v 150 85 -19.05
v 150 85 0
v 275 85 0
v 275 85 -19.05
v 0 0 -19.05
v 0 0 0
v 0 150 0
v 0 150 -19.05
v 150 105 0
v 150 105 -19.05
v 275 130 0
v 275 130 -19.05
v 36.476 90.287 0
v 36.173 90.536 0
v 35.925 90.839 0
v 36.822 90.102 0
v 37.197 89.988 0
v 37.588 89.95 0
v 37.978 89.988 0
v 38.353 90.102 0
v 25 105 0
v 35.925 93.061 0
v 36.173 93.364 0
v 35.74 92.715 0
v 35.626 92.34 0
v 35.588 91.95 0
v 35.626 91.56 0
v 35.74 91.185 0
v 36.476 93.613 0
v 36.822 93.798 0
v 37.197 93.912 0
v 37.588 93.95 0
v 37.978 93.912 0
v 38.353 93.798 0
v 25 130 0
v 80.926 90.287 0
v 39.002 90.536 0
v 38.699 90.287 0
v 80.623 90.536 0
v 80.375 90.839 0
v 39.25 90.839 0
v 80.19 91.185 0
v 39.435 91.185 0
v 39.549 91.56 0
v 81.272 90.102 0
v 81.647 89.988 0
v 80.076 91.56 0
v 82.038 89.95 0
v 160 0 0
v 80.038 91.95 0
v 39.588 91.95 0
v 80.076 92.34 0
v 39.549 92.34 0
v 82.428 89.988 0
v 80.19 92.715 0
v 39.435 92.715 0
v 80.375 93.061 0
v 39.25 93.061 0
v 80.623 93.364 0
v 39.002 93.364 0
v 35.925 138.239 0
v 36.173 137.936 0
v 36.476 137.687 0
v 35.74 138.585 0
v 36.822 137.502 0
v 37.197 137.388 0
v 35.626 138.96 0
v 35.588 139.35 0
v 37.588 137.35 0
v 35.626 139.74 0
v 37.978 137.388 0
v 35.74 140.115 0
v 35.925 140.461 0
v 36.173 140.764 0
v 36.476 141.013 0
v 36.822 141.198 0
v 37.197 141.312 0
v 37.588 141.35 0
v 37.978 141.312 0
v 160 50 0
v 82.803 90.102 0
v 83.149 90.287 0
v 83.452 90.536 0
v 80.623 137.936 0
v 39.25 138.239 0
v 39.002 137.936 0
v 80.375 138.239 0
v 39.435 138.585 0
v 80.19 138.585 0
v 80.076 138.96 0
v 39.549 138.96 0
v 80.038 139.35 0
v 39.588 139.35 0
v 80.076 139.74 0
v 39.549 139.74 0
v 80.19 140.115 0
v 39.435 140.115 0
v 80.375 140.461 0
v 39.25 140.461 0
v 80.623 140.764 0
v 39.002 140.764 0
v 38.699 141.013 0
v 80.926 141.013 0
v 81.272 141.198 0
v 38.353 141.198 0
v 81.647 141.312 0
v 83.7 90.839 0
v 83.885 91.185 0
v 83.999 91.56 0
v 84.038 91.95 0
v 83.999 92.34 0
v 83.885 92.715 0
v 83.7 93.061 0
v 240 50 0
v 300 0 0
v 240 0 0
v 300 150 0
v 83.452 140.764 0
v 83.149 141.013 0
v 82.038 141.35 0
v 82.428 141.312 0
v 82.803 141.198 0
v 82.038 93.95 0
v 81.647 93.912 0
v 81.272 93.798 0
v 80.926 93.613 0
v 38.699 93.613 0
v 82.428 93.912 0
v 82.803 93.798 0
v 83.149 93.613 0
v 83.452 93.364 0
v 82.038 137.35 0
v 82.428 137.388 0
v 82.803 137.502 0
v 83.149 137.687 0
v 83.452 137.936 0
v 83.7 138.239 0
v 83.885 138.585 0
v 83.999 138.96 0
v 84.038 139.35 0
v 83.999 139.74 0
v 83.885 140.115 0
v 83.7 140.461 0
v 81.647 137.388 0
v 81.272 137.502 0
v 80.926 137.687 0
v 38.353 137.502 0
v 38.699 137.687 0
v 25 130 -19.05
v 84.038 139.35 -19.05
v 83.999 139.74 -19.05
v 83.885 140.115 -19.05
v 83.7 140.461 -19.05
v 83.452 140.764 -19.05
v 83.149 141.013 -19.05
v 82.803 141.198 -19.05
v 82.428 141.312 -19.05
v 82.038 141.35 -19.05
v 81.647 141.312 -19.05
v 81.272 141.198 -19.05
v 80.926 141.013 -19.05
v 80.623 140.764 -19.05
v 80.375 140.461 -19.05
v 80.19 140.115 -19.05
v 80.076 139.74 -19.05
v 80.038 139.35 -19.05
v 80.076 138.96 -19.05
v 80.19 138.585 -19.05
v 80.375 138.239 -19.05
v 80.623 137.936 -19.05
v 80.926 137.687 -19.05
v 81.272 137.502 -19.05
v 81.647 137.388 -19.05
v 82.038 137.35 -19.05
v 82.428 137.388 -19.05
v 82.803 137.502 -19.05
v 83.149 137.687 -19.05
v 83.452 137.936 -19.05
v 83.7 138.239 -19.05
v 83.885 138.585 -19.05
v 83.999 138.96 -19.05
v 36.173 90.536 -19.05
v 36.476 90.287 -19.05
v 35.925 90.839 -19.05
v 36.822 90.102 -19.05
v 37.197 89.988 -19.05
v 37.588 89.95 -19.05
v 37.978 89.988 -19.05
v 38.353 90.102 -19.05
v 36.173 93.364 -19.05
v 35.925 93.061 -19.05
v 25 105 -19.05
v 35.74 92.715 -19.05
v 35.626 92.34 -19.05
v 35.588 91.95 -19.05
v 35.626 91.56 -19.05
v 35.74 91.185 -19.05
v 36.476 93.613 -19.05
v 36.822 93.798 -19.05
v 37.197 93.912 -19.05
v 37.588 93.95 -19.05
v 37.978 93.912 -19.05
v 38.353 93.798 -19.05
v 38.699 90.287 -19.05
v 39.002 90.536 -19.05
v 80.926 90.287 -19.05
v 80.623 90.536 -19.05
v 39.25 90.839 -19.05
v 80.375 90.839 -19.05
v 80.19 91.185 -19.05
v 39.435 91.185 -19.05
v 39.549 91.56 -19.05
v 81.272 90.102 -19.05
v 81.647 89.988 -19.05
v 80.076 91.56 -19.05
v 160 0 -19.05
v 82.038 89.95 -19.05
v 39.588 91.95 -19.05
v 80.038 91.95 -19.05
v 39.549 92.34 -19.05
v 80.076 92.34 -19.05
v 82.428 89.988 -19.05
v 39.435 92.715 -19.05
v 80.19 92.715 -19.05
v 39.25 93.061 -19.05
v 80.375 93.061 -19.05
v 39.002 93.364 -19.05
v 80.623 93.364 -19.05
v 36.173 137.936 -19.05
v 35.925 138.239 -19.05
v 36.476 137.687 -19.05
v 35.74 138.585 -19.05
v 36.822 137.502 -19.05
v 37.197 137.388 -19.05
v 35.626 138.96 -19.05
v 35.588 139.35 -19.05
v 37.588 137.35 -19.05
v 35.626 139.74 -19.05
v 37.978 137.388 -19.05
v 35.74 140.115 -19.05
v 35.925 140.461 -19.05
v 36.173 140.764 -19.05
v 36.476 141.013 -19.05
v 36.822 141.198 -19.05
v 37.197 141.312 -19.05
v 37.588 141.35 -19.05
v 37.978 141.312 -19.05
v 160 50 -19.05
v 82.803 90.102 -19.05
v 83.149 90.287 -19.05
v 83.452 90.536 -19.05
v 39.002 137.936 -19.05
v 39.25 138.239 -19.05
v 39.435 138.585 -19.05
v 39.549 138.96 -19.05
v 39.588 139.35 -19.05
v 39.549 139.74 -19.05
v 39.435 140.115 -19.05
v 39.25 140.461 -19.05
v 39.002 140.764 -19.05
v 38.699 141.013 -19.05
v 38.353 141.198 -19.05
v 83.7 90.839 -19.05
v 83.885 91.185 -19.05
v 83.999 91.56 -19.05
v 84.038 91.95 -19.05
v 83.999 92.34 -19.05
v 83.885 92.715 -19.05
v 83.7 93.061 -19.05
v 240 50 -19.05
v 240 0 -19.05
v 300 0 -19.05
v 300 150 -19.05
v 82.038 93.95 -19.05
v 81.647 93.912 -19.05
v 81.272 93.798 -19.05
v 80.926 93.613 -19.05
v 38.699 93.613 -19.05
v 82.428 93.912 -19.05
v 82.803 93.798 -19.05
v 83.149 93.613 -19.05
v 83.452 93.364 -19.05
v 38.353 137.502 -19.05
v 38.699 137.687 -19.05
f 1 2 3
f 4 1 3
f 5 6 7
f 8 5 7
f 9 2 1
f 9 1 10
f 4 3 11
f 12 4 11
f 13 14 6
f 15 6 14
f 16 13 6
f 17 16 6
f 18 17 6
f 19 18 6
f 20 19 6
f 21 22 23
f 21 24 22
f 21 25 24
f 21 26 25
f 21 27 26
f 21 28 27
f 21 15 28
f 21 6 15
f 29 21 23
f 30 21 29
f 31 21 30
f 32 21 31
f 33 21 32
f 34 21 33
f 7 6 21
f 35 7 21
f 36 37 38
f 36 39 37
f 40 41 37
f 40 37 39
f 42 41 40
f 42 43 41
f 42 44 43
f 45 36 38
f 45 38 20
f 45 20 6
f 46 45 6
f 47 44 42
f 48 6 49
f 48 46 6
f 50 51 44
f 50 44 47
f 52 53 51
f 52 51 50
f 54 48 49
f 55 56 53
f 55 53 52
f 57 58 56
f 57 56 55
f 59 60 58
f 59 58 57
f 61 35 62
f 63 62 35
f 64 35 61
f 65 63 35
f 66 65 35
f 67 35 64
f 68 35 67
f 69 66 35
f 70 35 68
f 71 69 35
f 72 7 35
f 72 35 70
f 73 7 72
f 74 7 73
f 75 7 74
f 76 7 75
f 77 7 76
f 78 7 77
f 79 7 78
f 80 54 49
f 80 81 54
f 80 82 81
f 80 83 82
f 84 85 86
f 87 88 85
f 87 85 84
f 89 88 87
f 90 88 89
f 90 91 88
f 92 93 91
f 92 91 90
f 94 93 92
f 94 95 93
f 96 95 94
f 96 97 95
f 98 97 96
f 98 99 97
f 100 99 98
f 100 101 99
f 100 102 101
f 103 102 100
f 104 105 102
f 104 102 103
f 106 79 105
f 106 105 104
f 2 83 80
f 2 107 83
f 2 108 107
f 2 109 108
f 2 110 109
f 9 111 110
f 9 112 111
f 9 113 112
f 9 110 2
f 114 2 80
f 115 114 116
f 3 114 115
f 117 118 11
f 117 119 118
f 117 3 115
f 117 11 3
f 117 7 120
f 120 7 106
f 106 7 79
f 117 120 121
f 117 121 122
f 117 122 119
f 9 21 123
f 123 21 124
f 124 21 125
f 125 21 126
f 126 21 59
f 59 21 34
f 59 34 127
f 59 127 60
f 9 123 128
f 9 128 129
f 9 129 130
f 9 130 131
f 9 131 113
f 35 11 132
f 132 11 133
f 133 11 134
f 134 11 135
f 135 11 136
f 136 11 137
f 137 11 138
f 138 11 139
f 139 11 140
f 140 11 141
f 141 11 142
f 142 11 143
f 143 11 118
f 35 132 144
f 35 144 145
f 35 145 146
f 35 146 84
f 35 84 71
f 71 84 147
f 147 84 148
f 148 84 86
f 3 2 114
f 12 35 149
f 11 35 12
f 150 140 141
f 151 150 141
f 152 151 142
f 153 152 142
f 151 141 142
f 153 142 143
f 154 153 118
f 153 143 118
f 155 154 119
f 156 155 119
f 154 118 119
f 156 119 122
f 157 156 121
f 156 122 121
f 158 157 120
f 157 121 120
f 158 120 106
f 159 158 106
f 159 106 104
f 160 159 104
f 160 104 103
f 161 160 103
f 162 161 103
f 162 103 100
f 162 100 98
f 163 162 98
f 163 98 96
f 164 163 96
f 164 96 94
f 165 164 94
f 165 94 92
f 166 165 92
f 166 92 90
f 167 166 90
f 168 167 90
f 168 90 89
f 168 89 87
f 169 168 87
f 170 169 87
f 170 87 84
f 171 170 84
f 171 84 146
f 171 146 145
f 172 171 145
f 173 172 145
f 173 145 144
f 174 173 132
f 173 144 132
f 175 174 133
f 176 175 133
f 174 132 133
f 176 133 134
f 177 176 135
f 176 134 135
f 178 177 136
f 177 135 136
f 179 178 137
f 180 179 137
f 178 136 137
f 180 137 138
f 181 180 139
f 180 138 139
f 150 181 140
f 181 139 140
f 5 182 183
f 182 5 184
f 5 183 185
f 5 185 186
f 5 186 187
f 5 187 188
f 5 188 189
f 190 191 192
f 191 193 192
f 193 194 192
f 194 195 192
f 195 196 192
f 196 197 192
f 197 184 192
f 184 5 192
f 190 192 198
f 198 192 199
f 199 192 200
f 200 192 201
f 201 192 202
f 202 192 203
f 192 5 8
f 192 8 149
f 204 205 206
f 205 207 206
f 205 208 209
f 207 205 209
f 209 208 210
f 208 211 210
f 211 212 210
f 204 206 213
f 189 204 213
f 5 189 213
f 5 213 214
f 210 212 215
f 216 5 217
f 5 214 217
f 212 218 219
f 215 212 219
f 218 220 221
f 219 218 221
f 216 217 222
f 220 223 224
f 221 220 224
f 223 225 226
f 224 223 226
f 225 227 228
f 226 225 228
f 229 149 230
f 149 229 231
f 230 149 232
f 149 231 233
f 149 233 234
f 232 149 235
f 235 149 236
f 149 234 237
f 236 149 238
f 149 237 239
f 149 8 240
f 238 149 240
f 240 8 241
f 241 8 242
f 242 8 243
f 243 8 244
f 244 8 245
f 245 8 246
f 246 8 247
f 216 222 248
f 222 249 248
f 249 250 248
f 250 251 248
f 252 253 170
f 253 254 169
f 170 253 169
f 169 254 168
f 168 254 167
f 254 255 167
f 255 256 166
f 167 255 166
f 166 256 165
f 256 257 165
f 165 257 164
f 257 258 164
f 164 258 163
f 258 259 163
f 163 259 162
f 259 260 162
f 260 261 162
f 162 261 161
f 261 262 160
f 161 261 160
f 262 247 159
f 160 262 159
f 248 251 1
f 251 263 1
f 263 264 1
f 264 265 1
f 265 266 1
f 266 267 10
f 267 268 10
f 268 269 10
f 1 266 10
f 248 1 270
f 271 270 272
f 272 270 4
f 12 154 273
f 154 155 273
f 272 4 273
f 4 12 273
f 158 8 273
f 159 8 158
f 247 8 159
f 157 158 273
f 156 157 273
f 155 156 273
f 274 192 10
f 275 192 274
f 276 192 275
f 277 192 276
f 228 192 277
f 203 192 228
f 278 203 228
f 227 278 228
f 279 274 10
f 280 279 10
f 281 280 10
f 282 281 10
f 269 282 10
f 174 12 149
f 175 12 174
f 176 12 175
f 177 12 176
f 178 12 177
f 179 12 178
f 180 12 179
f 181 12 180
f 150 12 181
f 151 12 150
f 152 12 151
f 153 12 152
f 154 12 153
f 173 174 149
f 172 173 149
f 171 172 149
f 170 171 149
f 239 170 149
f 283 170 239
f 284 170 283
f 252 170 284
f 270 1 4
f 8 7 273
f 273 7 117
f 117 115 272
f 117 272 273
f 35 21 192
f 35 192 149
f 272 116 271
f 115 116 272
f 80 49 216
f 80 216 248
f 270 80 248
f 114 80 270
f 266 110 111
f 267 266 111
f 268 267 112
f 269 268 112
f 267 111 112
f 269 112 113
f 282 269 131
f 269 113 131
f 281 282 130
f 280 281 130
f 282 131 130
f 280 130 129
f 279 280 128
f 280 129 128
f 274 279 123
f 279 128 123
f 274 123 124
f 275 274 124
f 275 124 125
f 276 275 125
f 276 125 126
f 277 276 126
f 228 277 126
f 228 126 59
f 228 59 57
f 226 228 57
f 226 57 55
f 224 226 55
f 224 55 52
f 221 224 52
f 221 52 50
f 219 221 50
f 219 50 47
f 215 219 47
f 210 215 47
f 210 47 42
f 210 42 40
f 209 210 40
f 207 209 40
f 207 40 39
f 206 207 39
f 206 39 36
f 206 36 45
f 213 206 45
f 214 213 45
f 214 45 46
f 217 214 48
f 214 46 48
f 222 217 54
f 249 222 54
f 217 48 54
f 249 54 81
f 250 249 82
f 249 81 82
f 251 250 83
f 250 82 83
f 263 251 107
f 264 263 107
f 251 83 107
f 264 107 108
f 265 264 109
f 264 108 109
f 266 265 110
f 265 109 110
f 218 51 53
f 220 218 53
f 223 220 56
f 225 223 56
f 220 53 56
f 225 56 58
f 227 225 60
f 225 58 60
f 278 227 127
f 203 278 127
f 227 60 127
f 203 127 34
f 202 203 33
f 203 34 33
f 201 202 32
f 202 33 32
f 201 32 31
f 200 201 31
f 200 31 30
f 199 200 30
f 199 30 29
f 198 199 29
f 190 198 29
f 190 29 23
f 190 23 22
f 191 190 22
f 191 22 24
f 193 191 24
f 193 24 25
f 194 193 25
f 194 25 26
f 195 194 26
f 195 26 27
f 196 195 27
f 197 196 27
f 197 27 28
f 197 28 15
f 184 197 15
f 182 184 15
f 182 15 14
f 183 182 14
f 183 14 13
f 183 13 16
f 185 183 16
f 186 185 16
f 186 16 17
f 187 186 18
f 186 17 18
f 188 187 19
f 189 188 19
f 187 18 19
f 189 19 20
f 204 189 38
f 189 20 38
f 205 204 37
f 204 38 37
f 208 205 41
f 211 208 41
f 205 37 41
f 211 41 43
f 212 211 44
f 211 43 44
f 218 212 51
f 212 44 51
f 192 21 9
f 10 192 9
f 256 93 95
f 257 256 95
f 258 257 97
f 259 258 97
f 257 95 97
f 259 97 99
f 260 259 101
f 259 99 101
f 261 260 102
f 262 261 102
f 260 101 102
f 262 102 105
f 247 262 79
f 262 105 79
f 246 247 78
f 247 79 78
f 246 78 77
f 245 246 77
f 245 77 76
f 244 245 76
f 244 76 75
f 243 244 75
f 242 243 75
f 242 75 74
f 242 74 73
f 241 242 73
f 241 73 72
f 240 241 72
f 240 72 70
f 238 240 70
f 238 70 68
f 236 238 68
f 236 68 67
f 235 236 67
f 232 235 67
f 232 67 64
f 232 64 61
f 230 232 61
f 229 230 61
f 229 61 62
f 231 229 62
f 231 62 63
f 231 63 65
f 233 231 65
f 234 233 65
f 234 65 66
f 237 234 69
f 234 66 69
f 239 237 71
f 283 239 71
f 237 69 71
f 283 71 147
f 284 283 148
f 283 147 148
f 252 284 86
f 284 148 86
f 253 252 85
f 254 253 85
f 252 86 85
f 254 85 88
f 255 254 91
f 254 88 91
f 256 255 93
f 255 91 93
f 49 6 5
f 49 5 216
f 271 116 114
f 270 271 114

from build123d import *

# Parameters (mm, degrees)
SKETCH1_W          = 300
SKETCH1_H          = 150
BLOCK_DEPTH        = 19.05
SKETCH3_W          = 250
SKETCH3_H          = 25
CUT_EXTRUDE2_DEPTH = 39.961179
SKETCH6_W          = 125
SKETCH6_H          = 20
CUT_EXTRUDE5_DEPTH = 20.05
SKETCH7_W          = 80
SKETCH7_H          = 50
CUT_EXTRUDE6_DEPTH = 20.05
SKETCH8_R          = 2
CUT_EXTRUDE7_DEPTH = 20.05


with BuildPart() as part:
    # Sketch1 → block (new body)
    with BuildSketch(Plane.XY):
        with Locations((150, 75)):
            Rectangle(SKETCH1_W, SKETCH1_H)
    extrude(amount=-BLOCK_DEPTH)

    # Sketch3 → Cut-Extrude2 (cut)
    with BuildSketch(Plane.XY):
        with Locations((150, 117.5)):
            Rectangle(SKETCH3_W, SKETCH3_H)
    extrude(amount=-CUT_EXTRUDE2_DEPTH, mode=Mode.SUBTRACT)

    # Sketch6 → Cut-Extrude5 (cut, through all)
    with BuildSketch(Plane.XY):
        with Locations((212.5, 95)):
            Rectangle(SKETCH6_W, SKETCH6_H)
    extrude(amount=-CUT_EXTRUDE5_DEPTH, mode=Mode.SUBTRACT)

    # Sketch7 → Cut-Extrude6 (cut, through all)
    with BuildSketch(Plane.XY):
        with Locations((200, 25)):
            Rectangle(SKETCH7_W, SKETCH7_H)
    extrude(amount=-CUT_EXTRUDE6_DEPTH, mode=Mode.SUBTRACT)

    # Sketch8 → Cut-Extrude7 (cut, through all)
    with BuildSketch(Plane.XY):
        with Locations((37.5875, 139.35)):
            Circle(SKETCH8_R)
        with Locations((82.0375, 139.35)):
            Circle(SKETCH8_R)
        with Locations((37.5875, 91.95)):
            Circle(SKETCH8_R)
        with Locations((82.0375, 91.95)):
            Circle(SKETCH8_R)
    extrude(amount=-CUT_EXTRUDE7_DEPTH, mode=Mode.SUBTRACT)


solid = part.part
